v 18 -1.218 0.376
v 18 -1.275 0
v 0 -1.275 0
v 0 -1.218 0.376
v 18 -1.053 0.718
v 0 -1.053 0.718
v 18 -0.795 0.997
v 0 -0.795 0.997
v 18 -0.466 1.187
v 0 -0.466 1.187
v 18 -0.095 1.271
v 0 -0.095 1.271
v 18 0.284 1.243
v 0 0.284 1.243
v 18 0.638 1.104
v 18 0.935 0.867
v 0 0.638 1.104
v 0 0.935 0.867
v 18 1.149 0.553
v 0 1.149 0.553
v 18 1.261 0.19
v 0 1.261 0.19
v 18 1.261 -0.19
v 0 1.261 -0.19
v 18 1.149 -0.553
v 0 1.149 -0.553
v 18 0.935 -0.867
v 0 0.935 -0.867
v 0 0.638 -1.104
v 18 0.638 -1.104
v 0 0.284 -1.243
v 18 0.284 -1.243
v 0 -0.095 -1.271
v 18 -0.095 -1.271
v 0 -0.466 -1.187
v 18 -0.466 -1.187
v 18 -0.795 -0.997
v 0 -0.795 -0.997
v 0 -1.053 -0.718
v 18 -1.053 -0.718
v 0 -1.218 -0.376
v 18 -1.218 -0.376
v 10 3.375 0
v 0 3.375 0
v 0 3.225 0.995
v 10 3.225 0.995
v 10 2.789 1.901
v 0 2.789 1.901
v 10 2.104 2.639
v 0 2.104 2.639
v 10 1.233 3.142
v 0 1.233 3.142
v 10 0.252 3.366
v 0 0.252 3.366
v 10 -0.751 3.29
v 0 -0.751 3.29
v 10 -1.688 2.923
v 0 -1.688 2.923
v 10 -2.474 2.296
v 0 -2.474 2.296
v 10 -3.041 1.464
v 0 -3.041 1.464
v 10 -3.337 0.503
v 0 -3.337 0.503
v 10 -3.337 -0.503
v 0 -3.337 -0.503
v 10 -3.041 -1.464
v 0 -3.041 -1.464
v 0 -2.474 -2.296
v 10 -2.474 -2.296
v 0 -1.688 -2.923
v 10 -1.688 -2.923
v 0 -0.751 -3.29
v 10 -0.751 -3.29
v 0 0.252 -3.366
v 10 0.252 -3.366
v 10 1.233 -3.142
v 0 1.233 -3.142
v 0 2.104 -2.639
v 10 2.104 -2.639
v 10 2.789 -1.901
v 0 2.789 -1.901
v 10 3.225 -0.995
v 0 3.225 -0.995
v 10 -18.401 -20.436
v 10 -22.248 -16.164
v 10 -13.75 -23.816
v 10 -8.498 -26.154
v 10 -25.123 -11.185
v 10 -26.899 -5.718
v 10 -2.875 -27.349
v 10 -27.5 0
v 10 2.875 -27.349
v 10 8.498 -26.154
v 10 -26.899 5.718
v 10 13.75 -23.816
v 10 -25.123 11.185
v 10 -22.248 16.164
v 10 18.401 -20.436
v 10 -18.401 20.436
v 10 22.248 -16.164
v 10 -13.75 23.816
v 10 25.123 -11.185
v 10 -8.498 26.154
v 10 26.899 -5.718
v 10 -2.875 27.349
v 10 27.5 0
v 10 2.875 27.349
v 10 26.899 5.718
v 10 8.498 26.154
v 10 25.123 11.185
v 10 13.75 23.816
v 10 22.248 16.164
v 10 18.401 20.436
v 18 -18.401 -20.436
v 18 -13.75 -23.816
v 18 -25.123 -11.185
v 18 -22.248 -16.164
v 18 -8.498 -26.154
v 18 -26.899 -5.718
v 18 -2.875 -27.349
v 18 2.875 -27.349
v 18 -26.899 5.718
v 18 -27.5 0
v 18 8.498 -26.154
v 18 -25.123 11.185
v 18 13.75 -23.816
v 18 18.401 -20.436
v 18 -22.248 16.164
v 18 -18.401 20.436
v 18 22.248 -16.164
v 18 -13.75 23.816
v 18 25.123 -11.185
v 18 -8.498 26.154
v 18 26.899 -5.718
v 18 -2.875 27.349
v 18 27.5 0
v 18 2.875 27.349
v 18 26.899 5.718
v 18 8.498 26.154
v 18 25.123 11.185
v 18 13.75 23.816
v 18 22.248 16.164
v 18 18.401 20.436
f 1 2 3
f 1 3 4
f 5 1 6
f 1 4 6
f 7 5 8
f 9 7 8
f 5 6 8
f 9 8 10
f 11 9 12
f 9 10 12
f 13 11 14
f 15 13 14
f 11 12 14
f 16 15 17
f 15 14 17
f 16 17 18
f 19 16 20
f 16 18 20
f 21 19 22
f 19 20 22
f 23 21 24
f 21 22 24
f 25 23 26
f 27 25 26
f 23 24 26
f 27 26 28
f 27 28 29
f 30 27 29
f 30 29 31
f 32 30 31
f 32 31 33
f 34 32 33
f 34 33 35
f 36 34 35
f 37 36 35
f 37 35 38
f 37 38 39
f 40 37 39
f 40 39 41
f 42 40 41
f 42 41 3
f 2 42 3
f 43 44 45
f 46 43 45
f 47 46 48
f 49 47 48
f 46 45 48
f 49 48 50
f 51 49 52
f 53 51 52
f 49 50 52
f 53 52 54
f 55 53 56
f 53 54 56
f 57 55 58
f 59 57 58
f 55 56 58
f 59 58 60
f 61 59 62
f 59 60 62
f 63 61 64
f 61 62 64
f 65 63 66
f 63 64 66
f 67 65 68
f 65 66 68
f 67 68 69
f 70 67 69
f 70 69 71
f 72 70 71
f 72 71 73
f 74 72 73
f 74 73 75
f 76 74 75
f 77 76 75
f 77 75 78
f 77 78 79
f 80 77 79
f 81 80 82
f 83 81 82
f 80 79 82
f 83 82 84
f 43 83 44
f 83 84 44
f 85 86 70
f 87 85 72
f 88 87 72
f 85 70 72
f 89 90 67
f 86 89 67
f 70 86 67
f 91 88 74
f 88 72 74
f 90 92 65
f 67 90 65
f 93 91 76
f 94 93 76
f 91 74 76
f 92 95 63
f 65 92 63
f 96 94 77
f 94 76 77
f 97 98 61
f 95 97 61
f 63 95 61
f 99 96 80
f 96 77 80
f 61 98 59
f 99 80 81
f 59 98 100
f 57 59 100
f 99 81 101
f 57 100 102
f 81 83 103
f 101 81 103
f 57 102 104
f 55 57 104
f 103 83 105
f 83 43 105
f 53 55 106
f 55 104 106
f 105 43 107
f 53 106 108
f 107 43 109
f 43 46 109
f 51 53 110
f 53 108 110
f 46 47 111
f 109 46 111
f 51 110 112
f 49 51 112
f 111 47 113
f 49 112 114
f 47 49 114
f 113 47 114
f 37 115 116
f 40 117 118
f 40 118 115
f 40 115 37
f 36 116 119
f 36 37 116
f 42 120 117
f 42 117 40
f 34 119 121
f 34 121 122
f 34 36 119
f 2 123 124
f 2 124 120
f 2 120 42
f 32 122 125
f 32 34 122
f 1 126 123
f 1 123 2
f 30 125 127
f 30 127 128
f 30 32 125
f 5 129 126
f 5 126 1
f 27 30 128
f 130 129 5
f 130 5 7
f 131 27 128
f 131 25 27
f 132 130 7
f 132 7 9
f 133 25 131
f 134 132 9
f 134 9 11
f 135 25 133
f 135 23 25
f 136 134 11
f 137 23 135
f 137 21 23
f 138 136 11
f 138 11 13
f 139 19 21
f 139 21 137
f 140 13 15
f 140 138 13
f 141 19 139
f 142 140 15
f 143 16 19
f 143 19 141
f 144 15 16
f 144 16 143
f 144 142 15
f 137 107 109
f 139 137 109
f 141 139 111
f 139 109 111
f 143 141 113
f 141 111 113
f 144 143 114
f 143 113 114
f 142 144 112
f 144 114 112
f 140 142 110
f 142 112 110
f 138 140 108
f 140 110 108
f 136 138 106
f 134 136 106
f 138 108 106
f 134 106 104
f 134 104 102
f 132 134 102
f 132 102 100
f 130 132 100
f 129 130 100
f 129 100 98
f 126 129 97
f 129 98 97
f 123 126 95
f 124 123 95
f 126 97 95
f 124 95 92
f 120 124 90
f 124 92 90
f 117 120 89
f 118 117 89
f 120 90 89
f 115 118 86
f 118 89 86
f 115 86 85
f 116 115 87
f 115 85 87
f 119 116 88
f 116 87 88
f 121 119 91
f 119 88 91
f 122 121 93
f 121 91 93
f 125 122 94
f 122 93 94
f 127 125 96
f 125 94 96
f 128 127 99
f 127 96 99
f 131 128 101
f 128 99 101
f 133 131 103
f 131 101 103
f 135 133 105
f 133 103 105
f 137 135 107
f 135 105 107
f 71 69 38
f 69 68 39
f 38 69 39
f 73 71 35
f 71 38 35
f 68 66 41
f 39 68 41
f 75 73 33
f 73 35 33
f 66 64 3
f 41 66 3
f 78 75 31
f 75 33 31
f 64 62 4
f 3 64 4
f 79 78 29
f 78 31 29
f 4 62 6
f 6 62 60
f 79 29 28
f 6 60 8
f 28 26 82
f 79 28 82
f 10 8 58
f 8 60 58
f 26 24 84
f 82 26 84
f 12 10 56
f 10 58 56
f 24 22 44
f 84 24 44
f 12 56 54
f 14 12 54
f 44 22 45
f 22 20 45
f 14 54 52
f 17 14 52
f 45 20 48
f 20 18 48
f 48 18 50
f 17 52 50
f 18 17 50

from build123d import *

# Parameters (mm, degrees)
F0_R     = 3.375
F1_DEPTH = 10
F2_R     = 27.5
F2_R_2   = 3.375
F3_DEPTH = 8
F4_R     = 1.275
F5_DEPTH = 25.4


with BuildPart() as f1:
    # F0 (on Right) → F1 (new body)
    with BuildSketch(Plane.YZ):
        Circle(F0_R)
    extrude(amount=F1_DEPTH)

    # F2 (on face) → F3 (join)
    with BuildSketch(Plane.YZ.offset(10)):
        Circle(F2_R)
        Circle(F2_R_2, mode=Mode.SUBTRACT)
        Circle(F2_R_2)
    extrude(amount=F3_DEPTH)

    # F4 (on face) → F5 (cut)
    with BuildSketch(Plane(origin=(0, 0, 0), x_dir=(0, -1, 0), z_dir=(-1, 0, 0))):
        Circle(F4_R)
    extrude(amount=-F5_DEPTH, mode=Mode.SUBTRACT)


solid = f1.part
